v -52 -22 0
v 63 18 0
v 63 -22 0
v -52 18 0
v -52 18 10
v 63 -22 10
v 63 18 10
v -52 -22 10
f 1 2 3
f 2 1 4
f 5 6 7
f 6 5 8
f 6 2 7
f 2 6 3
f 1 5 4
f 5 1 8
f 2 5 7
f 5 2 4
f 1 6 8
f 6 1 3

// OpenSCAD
// Parameters
main_text = "OPENS";    // Main text
subscript_text = "n";   // Subscript
font_size_main = 20;    // Main text font size
font_size_sub = 12;     // Subscript font size
extrude_depth = 10;     // Thickness of the letters
font_style = "Liberation Sans:style=Bold";  // Font selection

// Generate the main text (Extruded)
module main_text_model() {
    linear_extrude(height=extrude_depth)
        text(main_text, size=font_size_main, font=font_style, halign="center", valign="center");
}

// Generate the subscript text (Extruded)
module subscript_model() {
    translate([font_size_main * 1.8 + 17, -font_size_main * 0.25 - 5, 0])  // Adjust subscript position
    linear_extrude(height=extrude_depth)
        text(subscript_text, size=font_size_sub, font=font_style, halign="center", valign="center");
}

module block() {
    color("cyan", 0.3) translate([-52, -22, 0]) cube([115, 40, 10]);
}

// Render the fully extruded model
main_text_model();
subscript_model();
block();
